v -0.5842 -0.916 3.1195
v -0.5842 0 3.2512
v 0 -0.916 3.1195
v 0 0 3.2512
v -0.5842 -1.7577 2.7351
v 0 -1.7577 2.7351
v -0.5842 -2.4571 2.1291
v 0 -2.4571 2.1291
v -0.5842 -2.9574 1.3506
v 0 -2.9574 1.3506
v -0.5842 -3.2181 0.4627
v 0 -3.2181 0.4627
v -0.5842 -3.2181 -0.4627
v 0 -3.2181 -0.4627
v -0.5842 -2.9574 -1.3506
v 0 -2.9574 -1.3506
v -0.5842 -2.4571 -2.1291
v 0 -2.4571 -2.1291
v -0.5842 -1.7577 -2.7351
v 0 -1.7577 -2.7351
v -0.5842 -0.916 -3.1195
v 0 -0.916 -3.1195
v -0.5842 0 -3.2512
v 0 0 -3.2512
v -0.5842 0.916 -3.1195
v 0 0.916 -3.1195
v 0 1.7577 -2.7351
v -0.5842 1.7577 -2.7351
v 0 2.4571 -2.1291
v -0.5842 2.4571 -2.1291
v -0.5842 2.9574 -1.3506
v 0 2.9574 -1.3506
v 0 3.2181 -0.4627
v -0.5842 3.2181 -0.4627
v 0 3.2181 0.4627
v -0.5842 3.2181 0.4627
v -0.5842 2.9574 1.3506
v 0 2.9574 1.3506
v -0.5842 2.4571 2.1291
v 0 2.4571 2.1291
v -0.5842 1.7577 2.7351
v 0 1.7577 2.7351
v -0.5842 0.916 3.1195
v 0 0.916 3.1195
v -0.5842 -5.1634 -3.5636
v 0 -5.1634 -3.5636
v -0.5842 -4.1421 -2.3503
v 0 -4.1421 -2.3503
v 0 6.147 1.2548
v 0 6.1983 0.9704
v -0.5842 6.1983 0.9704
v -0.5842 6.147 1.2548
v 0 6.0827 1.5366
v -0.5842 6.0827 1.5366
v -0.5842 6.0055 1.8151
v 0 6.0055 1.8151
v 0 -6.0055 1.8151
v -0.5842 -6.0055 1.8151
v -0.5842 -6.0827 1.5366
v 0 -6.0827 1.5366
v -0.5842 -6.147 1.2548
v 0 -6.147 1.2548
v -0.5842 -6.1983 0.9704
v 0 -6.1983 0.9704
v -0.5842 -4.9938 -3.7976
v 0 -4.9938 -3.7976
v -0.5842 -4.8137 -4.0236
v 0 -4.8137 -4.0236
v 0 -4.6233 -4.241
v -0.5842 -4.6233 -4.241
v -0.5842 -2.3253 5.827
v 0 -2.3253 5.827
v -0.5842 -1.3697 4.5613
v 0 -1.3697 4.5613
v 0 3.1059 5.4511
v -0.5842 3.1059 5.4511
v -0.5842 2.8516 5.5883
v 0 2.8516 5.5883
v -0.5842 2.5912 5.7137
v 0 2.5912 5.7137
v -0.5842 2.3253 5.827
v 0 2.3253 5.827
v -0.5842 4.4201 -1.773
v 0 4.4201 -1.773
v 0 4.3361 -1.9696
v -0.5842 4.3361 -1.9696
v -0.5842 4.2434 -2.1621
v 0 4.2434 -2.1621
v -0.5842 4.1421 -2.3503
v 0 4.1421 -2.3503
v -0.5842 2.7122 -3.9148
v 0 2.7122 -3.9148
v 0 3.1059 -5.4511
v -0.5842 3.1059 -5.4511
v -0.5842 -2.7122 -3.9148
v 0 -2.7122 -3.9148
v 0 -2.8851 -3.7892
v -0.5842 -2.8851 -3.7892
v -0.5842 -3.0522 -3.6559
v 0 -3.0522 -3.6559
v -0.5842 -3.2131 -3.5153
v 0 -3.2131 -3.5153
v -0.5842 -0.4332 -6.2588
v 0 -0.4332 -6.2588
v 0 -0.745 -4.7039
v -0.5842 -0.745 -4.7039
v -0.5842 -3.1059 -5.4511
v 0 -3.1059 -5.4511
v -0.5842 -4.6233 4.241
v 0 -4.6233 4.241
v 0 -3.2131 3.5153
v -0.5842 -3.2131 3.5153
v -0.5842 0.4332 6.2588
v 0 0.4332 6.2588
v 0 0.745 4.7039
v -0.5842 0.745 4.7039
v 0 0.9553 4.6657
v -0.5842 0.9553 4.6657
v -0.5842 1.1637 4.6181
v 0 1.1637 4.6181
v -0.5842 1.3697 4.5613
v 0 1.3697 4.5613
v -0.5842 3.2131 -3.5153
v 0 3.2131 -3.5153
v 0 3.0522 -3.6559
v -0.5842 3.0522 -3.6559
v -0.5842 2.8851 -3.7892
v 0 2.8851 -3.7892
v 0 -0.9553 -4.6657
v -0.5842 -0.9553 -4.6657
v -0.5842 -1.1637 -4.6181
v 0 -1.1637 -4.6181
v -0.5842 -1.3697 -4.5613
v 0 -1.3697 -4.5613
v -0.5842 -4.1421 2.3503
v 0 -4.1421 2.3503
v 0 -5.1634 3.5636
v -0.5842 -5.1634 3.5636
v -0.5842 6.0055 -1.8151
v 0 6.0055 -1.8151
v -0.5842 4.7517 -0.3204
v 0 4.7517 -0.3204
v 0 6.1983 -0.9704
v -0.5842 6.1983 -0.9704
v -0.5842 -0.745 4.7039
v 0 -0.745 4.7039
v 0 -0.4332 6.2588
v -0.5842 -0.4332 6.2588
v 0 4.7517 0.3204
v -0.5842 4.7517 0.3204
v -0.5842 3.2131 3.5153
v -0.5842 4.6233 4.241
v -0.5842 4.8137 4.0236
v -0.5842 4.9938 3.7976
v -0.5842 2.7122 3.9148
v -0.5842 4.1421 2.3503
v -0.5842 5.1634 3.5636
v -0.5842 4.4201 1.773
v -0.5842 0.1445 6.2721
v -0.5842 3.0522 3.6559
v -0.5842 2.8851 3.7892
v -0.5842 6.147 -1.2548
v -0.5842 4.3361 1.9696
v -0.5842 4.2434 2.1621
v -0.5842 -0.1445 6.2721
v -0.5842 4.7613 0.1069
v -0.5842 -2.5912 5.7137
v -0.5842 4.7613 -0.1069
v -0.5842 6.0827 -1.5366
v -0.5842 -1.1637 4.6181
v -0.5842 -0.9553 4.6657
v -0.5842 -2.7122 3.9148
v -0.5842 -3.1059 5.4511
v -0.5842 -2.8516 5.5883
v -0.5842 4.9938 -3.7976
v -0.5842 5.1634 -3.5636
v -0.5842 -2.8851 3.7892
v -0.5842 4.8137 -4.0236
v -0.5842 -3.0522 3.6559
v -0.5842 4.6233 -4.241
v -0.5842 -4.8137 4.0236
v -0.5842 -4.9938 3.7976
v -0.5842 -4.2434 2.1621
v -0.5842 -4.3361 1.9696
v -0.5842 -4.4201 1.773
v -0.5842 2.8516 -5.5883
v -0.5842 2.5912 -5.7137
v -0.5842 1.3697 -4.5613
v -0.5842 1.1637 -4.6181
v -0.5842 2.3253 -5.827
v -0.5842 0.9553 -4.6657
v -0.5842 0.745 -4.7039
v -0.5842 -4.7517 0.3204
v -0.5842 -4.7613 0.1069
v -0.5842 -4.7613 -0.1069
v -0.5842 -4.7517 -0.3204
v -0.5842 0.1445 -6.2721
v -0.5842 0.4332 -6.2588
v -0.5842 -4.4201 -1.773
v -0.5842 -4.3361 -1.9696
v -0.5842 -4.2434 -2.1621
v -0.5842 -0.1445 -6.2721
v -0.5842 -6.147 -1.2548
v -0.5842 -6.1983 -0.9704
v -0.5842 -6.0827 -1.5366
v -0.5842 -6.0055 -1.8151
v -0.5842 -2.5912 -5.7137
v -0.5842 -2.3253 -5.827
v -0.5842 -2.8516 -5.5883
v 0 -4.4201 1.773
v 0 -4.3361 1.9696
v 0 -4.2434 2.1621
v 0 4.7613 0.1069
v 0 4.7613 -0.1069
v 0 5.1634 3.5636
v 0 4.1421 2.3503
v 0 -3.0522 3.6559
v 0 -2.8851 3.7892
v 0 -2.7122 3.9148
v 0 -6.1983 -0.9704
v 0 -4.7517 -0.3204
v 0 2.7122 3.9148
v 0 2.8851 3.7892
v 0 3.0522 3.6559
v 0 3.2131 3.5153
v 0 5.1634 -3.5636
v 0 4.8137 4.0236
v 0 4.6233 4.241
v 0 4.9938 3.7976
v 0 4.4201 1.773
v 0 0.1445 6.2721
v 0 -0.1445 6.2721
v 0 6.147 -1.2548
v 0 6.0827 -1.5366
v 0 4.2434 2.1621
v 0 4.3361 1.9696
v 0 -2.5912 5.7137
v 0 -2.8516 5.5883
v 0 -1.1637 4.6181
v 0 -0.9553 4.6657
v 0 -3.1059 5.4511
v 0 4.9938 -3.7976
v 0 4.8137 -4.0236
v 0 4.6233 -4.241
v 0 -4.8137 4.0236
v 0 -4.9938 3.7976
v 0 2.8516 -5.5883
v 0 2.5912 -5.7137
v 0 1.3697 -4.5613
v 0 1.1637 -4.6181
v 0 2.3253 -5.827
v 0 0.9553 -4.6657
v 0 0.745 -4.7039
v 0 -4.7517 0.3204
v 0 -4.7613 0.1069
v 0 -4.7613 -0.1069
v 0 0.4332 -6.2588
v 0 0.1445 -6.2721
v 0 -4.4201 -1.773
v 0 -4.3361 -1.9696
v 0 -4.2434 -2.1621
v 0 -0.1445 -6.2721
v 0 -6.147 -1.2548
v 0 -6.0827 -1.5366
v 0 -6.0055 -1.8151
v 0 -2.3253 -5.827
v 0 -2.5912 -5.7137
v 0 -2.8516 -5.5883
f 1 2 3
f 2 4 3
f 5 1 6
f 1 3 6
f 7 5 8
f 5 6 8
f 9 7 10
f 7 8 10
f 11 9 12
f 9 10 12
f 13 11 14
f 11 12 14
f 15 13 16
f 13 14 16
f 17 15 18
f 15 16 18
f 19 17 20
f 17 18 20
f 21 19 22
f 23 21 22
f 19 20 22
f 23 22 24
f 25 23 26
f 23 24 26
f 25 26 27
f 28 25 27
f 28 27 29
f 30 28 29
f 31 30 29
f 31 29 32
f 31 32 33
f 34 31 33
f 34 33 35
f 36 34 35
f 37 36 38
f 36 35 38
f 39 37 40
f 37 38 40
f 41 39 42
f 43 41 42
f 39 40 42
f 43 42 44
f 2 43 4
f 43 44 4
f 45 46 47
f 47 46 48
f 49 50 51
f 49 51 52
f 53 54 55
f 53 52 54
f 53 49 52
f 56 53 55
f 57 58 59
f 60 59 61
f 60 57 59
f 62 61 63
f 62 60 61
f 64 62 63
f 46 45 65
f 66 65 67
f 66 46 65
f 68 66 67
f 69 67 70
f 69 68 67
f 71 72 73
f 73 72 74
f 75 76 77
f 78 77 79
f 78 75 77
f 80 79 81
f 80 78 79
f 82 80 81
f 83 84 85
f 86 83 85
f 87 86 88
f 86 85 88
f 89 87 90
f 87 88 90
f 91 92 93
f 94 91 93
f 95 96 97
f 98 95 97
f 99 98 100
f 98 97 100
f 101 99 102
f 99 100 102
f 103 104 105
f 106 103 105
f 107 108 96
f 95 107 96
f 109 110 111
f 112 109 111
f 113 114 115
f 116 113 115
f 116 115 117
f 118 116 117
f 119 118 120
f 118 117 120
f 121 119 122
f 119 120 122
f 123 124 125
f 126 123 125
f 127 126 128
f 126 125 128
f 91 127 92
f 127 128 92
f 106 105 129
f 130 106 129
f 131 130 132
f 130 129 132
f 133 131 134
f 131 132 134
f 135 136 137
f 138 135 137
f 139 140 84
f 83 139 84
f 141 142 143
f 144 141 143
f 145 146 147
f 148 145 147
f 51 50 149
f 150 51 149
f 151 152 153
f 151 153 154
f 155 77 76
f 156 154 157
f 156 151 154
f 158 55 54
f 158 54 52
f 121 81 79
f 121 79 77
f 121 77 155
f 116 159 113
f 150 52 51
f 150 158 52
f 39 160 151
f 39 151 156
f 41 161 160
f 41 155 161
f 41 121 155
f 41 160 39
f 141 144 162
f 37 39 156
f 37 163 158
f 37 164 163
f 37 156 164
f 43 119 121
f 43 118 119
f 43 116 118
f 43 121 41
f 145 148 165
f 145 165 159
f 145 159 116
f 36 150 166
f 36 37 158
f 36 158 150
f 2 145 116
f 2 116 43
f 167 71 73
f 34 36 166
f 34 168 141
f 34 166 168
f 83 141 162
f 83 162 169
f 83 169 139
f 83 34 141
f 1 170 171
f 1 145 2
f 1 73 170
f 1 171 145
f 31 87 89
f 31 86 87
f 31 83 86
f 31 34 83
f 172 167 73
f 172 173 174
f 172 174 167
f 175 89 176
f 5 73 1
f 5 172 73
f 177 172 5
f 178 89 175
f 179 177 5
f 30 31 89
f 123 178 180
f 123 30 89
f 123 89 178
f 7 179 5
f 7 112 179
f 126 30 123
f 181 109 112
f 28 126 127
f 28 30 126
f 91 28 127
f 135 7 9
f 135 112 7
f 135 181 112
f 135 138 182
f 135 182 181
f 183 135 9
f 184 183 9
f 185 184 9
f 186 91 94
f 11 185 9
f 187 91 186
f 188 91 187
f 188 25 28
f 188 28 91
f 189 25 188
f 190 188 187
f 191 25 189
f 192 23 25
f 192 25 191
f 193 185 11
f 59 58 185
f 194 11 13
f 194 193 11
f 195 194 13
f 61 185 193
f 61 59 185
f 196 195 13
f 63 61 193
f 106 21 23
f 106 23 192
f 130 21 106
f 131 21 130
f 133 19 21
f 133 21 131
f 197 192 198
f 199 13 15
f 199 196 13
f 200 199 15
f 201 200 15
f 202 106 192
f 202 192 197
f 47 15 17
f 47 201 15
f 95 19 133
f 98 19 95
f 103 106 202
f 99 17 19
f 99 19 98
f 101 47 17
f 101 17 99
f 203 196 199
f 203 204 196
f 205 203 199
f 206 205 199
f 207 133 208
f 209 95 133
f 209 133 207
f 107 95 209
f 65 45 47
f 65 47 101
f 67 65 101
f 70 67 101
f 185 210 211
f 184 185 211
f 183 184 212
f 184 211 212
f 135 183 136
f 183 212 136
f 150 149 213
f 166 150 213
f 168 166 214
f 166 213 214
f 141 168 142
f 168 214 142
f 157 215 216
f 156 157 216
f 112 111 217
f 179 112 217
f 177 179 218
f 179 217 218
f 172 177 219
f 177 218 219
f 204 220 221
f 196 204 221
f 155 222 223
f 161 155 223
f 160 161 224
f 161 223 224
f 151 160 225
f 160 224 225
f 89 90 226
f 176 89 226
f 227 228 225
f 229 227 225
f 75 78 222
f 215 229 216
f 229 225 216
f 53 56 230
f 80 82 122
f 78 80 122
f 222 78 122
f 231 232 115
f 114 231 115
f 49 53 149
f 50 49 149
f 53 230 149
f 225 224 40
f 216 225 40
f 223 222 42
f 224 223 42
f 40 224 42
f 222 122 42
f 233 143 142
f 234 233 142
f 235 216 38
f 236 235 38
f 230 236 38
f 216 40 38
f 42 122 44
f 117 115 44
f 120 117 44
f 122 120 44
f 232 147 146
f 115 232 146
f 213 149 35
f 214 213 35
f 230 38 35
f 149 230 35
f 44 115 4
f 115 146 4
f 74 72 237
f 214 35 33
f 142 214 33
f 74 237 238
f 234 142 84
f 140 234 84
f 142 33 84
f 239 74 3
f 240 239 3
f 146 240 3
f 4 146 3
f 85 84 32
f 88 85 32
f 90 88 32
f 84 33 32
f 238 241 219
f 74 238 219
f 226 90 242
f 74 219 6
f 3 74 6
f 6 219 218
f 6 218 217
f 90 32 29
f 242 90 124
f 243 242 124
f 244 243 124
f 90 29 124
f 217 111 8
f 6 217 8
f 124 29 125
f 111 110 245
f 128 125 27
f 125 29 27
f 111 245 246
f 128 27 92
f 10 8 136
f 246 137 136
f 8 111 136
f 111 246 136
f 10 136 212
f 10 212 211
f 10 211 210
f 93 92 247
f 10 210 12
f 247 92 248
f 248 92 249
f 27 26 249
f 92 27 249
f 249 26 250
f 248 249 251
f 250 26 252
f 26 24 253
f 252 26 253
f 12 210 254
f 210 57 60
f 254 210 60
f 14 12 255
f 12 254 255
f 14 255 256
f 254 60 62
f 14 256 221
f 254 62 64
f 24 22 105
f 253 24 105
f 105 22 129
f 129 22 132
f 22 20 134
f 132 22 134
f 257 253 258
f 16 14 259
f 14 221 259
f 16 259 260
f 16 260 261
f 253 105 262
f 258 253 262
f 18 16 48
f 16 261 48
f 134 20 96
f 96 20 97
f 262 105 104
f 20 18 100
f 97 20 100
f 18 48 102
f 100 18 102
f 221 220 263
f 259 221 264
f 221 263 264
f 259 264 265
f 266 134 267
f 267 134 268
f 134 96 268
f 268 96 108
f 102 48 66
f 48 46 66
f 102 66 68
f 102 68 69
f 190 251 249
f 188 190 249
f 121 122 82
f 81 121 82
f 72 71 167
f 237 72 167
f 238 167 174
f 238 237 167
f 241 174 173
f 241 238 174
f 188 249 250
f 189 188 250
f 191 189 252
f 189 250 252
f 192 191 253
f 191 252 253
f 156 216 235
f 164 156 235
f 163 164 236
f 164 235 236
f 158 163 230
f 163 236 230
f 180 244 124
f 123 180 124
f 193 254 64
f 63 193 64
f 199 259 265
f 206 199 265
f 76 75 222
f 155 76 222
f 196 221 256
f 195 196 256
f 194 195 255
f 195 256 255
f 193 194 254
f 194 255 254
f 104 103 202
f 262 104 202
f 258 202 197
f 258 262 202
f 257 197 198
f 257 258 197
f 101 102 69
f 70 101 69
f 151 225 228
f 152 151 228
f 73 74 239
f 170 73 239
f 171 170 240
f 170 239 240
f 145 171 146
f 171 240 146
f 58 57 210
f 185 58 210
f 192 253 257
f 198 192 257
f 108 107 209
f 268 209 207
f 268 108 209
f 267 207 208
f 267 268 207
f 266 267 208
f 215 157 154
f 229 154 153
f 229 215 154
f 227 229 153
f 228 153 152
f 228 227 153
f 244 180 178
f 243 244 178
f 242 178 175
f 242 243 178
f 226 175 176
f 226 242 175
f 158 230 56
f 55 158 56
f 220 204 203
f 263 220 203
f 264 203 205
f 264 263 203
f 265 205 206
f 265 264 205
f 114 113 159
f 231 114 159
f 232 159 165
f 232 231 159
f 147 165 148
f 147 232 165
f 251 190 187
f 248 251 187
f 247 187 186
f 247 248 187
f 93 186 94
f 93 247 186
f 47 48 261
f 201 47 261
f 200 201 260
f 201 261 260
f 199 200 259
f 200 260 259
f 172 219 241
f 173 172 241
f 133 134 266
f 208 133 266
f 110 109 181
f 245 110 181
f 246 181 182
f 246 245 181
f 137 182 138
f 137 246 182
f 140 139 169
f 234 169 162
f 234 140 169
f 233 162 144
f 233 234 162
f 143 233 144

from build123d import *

# Parameters (mm, degrees)
SECSKE_W      = 0.5842
SECSKE_H      = 3.0226
EXTCUT_DEPTH  = 9.891705265
EXTCUTS_COUNT = 14
EXTCUTS_ANGLE = 334.285714286


with BuildPart() as part:
    # SecSke → Body (revolve)
    with BuildSketch(Plane.XY, mode=Mode.PRIVATE) as body_sk:
        with Locations((-0.2921, 4.7625)):
            Rectangle(SECSKE_W, SECSKE_H)
    revolve(body_sk.sketch.rotate(Axis((-34.925, 0, 0), (1, 0, 0)), 90), axis=Axis((-34.925, 0, 0), (1, 0, 0)))

    # ExtCutSke → ExtCut (cut, through all)
    with BuildSketch(Plane(origin=(0, 0, 0), x_dir=(0, 0, -1), z_dir=(1, 0, 0))):
        with BuildLine():
            Line((-1.103445571, 6.494415476), (-0.320368639, 4.751712342))
            ThreePointArc((-0.320368639, 4.751712342), (0, 4.7625), (0.320368639, 4.751712342))
            Line((0.320368639, 4.751712342), (1.103445571, 6.494415476))
            ThreePointArc((1.103445571, 6.494415476), (0, 6.58749), (-1.103445571, 6.494415476))
        make_face()
    extcut = extrude(amount=-EXTCUT_DEPTH, mode=Mode.SUBTRACT)

    # ExtCuts: ExtCut ×14 about axis
    extcuts_axis = Axis((-34.925, 0, 0), (1, 0, 0))
    for i in range(1, EXTCUTS_COUNT):
        add(extcut.rotate(extcuts_axis, i * EXTCUTS_ANGLE / (EXTCUTS_COUNT - 1)), mode=Mode.SUBTRACT)


solid = part.part
